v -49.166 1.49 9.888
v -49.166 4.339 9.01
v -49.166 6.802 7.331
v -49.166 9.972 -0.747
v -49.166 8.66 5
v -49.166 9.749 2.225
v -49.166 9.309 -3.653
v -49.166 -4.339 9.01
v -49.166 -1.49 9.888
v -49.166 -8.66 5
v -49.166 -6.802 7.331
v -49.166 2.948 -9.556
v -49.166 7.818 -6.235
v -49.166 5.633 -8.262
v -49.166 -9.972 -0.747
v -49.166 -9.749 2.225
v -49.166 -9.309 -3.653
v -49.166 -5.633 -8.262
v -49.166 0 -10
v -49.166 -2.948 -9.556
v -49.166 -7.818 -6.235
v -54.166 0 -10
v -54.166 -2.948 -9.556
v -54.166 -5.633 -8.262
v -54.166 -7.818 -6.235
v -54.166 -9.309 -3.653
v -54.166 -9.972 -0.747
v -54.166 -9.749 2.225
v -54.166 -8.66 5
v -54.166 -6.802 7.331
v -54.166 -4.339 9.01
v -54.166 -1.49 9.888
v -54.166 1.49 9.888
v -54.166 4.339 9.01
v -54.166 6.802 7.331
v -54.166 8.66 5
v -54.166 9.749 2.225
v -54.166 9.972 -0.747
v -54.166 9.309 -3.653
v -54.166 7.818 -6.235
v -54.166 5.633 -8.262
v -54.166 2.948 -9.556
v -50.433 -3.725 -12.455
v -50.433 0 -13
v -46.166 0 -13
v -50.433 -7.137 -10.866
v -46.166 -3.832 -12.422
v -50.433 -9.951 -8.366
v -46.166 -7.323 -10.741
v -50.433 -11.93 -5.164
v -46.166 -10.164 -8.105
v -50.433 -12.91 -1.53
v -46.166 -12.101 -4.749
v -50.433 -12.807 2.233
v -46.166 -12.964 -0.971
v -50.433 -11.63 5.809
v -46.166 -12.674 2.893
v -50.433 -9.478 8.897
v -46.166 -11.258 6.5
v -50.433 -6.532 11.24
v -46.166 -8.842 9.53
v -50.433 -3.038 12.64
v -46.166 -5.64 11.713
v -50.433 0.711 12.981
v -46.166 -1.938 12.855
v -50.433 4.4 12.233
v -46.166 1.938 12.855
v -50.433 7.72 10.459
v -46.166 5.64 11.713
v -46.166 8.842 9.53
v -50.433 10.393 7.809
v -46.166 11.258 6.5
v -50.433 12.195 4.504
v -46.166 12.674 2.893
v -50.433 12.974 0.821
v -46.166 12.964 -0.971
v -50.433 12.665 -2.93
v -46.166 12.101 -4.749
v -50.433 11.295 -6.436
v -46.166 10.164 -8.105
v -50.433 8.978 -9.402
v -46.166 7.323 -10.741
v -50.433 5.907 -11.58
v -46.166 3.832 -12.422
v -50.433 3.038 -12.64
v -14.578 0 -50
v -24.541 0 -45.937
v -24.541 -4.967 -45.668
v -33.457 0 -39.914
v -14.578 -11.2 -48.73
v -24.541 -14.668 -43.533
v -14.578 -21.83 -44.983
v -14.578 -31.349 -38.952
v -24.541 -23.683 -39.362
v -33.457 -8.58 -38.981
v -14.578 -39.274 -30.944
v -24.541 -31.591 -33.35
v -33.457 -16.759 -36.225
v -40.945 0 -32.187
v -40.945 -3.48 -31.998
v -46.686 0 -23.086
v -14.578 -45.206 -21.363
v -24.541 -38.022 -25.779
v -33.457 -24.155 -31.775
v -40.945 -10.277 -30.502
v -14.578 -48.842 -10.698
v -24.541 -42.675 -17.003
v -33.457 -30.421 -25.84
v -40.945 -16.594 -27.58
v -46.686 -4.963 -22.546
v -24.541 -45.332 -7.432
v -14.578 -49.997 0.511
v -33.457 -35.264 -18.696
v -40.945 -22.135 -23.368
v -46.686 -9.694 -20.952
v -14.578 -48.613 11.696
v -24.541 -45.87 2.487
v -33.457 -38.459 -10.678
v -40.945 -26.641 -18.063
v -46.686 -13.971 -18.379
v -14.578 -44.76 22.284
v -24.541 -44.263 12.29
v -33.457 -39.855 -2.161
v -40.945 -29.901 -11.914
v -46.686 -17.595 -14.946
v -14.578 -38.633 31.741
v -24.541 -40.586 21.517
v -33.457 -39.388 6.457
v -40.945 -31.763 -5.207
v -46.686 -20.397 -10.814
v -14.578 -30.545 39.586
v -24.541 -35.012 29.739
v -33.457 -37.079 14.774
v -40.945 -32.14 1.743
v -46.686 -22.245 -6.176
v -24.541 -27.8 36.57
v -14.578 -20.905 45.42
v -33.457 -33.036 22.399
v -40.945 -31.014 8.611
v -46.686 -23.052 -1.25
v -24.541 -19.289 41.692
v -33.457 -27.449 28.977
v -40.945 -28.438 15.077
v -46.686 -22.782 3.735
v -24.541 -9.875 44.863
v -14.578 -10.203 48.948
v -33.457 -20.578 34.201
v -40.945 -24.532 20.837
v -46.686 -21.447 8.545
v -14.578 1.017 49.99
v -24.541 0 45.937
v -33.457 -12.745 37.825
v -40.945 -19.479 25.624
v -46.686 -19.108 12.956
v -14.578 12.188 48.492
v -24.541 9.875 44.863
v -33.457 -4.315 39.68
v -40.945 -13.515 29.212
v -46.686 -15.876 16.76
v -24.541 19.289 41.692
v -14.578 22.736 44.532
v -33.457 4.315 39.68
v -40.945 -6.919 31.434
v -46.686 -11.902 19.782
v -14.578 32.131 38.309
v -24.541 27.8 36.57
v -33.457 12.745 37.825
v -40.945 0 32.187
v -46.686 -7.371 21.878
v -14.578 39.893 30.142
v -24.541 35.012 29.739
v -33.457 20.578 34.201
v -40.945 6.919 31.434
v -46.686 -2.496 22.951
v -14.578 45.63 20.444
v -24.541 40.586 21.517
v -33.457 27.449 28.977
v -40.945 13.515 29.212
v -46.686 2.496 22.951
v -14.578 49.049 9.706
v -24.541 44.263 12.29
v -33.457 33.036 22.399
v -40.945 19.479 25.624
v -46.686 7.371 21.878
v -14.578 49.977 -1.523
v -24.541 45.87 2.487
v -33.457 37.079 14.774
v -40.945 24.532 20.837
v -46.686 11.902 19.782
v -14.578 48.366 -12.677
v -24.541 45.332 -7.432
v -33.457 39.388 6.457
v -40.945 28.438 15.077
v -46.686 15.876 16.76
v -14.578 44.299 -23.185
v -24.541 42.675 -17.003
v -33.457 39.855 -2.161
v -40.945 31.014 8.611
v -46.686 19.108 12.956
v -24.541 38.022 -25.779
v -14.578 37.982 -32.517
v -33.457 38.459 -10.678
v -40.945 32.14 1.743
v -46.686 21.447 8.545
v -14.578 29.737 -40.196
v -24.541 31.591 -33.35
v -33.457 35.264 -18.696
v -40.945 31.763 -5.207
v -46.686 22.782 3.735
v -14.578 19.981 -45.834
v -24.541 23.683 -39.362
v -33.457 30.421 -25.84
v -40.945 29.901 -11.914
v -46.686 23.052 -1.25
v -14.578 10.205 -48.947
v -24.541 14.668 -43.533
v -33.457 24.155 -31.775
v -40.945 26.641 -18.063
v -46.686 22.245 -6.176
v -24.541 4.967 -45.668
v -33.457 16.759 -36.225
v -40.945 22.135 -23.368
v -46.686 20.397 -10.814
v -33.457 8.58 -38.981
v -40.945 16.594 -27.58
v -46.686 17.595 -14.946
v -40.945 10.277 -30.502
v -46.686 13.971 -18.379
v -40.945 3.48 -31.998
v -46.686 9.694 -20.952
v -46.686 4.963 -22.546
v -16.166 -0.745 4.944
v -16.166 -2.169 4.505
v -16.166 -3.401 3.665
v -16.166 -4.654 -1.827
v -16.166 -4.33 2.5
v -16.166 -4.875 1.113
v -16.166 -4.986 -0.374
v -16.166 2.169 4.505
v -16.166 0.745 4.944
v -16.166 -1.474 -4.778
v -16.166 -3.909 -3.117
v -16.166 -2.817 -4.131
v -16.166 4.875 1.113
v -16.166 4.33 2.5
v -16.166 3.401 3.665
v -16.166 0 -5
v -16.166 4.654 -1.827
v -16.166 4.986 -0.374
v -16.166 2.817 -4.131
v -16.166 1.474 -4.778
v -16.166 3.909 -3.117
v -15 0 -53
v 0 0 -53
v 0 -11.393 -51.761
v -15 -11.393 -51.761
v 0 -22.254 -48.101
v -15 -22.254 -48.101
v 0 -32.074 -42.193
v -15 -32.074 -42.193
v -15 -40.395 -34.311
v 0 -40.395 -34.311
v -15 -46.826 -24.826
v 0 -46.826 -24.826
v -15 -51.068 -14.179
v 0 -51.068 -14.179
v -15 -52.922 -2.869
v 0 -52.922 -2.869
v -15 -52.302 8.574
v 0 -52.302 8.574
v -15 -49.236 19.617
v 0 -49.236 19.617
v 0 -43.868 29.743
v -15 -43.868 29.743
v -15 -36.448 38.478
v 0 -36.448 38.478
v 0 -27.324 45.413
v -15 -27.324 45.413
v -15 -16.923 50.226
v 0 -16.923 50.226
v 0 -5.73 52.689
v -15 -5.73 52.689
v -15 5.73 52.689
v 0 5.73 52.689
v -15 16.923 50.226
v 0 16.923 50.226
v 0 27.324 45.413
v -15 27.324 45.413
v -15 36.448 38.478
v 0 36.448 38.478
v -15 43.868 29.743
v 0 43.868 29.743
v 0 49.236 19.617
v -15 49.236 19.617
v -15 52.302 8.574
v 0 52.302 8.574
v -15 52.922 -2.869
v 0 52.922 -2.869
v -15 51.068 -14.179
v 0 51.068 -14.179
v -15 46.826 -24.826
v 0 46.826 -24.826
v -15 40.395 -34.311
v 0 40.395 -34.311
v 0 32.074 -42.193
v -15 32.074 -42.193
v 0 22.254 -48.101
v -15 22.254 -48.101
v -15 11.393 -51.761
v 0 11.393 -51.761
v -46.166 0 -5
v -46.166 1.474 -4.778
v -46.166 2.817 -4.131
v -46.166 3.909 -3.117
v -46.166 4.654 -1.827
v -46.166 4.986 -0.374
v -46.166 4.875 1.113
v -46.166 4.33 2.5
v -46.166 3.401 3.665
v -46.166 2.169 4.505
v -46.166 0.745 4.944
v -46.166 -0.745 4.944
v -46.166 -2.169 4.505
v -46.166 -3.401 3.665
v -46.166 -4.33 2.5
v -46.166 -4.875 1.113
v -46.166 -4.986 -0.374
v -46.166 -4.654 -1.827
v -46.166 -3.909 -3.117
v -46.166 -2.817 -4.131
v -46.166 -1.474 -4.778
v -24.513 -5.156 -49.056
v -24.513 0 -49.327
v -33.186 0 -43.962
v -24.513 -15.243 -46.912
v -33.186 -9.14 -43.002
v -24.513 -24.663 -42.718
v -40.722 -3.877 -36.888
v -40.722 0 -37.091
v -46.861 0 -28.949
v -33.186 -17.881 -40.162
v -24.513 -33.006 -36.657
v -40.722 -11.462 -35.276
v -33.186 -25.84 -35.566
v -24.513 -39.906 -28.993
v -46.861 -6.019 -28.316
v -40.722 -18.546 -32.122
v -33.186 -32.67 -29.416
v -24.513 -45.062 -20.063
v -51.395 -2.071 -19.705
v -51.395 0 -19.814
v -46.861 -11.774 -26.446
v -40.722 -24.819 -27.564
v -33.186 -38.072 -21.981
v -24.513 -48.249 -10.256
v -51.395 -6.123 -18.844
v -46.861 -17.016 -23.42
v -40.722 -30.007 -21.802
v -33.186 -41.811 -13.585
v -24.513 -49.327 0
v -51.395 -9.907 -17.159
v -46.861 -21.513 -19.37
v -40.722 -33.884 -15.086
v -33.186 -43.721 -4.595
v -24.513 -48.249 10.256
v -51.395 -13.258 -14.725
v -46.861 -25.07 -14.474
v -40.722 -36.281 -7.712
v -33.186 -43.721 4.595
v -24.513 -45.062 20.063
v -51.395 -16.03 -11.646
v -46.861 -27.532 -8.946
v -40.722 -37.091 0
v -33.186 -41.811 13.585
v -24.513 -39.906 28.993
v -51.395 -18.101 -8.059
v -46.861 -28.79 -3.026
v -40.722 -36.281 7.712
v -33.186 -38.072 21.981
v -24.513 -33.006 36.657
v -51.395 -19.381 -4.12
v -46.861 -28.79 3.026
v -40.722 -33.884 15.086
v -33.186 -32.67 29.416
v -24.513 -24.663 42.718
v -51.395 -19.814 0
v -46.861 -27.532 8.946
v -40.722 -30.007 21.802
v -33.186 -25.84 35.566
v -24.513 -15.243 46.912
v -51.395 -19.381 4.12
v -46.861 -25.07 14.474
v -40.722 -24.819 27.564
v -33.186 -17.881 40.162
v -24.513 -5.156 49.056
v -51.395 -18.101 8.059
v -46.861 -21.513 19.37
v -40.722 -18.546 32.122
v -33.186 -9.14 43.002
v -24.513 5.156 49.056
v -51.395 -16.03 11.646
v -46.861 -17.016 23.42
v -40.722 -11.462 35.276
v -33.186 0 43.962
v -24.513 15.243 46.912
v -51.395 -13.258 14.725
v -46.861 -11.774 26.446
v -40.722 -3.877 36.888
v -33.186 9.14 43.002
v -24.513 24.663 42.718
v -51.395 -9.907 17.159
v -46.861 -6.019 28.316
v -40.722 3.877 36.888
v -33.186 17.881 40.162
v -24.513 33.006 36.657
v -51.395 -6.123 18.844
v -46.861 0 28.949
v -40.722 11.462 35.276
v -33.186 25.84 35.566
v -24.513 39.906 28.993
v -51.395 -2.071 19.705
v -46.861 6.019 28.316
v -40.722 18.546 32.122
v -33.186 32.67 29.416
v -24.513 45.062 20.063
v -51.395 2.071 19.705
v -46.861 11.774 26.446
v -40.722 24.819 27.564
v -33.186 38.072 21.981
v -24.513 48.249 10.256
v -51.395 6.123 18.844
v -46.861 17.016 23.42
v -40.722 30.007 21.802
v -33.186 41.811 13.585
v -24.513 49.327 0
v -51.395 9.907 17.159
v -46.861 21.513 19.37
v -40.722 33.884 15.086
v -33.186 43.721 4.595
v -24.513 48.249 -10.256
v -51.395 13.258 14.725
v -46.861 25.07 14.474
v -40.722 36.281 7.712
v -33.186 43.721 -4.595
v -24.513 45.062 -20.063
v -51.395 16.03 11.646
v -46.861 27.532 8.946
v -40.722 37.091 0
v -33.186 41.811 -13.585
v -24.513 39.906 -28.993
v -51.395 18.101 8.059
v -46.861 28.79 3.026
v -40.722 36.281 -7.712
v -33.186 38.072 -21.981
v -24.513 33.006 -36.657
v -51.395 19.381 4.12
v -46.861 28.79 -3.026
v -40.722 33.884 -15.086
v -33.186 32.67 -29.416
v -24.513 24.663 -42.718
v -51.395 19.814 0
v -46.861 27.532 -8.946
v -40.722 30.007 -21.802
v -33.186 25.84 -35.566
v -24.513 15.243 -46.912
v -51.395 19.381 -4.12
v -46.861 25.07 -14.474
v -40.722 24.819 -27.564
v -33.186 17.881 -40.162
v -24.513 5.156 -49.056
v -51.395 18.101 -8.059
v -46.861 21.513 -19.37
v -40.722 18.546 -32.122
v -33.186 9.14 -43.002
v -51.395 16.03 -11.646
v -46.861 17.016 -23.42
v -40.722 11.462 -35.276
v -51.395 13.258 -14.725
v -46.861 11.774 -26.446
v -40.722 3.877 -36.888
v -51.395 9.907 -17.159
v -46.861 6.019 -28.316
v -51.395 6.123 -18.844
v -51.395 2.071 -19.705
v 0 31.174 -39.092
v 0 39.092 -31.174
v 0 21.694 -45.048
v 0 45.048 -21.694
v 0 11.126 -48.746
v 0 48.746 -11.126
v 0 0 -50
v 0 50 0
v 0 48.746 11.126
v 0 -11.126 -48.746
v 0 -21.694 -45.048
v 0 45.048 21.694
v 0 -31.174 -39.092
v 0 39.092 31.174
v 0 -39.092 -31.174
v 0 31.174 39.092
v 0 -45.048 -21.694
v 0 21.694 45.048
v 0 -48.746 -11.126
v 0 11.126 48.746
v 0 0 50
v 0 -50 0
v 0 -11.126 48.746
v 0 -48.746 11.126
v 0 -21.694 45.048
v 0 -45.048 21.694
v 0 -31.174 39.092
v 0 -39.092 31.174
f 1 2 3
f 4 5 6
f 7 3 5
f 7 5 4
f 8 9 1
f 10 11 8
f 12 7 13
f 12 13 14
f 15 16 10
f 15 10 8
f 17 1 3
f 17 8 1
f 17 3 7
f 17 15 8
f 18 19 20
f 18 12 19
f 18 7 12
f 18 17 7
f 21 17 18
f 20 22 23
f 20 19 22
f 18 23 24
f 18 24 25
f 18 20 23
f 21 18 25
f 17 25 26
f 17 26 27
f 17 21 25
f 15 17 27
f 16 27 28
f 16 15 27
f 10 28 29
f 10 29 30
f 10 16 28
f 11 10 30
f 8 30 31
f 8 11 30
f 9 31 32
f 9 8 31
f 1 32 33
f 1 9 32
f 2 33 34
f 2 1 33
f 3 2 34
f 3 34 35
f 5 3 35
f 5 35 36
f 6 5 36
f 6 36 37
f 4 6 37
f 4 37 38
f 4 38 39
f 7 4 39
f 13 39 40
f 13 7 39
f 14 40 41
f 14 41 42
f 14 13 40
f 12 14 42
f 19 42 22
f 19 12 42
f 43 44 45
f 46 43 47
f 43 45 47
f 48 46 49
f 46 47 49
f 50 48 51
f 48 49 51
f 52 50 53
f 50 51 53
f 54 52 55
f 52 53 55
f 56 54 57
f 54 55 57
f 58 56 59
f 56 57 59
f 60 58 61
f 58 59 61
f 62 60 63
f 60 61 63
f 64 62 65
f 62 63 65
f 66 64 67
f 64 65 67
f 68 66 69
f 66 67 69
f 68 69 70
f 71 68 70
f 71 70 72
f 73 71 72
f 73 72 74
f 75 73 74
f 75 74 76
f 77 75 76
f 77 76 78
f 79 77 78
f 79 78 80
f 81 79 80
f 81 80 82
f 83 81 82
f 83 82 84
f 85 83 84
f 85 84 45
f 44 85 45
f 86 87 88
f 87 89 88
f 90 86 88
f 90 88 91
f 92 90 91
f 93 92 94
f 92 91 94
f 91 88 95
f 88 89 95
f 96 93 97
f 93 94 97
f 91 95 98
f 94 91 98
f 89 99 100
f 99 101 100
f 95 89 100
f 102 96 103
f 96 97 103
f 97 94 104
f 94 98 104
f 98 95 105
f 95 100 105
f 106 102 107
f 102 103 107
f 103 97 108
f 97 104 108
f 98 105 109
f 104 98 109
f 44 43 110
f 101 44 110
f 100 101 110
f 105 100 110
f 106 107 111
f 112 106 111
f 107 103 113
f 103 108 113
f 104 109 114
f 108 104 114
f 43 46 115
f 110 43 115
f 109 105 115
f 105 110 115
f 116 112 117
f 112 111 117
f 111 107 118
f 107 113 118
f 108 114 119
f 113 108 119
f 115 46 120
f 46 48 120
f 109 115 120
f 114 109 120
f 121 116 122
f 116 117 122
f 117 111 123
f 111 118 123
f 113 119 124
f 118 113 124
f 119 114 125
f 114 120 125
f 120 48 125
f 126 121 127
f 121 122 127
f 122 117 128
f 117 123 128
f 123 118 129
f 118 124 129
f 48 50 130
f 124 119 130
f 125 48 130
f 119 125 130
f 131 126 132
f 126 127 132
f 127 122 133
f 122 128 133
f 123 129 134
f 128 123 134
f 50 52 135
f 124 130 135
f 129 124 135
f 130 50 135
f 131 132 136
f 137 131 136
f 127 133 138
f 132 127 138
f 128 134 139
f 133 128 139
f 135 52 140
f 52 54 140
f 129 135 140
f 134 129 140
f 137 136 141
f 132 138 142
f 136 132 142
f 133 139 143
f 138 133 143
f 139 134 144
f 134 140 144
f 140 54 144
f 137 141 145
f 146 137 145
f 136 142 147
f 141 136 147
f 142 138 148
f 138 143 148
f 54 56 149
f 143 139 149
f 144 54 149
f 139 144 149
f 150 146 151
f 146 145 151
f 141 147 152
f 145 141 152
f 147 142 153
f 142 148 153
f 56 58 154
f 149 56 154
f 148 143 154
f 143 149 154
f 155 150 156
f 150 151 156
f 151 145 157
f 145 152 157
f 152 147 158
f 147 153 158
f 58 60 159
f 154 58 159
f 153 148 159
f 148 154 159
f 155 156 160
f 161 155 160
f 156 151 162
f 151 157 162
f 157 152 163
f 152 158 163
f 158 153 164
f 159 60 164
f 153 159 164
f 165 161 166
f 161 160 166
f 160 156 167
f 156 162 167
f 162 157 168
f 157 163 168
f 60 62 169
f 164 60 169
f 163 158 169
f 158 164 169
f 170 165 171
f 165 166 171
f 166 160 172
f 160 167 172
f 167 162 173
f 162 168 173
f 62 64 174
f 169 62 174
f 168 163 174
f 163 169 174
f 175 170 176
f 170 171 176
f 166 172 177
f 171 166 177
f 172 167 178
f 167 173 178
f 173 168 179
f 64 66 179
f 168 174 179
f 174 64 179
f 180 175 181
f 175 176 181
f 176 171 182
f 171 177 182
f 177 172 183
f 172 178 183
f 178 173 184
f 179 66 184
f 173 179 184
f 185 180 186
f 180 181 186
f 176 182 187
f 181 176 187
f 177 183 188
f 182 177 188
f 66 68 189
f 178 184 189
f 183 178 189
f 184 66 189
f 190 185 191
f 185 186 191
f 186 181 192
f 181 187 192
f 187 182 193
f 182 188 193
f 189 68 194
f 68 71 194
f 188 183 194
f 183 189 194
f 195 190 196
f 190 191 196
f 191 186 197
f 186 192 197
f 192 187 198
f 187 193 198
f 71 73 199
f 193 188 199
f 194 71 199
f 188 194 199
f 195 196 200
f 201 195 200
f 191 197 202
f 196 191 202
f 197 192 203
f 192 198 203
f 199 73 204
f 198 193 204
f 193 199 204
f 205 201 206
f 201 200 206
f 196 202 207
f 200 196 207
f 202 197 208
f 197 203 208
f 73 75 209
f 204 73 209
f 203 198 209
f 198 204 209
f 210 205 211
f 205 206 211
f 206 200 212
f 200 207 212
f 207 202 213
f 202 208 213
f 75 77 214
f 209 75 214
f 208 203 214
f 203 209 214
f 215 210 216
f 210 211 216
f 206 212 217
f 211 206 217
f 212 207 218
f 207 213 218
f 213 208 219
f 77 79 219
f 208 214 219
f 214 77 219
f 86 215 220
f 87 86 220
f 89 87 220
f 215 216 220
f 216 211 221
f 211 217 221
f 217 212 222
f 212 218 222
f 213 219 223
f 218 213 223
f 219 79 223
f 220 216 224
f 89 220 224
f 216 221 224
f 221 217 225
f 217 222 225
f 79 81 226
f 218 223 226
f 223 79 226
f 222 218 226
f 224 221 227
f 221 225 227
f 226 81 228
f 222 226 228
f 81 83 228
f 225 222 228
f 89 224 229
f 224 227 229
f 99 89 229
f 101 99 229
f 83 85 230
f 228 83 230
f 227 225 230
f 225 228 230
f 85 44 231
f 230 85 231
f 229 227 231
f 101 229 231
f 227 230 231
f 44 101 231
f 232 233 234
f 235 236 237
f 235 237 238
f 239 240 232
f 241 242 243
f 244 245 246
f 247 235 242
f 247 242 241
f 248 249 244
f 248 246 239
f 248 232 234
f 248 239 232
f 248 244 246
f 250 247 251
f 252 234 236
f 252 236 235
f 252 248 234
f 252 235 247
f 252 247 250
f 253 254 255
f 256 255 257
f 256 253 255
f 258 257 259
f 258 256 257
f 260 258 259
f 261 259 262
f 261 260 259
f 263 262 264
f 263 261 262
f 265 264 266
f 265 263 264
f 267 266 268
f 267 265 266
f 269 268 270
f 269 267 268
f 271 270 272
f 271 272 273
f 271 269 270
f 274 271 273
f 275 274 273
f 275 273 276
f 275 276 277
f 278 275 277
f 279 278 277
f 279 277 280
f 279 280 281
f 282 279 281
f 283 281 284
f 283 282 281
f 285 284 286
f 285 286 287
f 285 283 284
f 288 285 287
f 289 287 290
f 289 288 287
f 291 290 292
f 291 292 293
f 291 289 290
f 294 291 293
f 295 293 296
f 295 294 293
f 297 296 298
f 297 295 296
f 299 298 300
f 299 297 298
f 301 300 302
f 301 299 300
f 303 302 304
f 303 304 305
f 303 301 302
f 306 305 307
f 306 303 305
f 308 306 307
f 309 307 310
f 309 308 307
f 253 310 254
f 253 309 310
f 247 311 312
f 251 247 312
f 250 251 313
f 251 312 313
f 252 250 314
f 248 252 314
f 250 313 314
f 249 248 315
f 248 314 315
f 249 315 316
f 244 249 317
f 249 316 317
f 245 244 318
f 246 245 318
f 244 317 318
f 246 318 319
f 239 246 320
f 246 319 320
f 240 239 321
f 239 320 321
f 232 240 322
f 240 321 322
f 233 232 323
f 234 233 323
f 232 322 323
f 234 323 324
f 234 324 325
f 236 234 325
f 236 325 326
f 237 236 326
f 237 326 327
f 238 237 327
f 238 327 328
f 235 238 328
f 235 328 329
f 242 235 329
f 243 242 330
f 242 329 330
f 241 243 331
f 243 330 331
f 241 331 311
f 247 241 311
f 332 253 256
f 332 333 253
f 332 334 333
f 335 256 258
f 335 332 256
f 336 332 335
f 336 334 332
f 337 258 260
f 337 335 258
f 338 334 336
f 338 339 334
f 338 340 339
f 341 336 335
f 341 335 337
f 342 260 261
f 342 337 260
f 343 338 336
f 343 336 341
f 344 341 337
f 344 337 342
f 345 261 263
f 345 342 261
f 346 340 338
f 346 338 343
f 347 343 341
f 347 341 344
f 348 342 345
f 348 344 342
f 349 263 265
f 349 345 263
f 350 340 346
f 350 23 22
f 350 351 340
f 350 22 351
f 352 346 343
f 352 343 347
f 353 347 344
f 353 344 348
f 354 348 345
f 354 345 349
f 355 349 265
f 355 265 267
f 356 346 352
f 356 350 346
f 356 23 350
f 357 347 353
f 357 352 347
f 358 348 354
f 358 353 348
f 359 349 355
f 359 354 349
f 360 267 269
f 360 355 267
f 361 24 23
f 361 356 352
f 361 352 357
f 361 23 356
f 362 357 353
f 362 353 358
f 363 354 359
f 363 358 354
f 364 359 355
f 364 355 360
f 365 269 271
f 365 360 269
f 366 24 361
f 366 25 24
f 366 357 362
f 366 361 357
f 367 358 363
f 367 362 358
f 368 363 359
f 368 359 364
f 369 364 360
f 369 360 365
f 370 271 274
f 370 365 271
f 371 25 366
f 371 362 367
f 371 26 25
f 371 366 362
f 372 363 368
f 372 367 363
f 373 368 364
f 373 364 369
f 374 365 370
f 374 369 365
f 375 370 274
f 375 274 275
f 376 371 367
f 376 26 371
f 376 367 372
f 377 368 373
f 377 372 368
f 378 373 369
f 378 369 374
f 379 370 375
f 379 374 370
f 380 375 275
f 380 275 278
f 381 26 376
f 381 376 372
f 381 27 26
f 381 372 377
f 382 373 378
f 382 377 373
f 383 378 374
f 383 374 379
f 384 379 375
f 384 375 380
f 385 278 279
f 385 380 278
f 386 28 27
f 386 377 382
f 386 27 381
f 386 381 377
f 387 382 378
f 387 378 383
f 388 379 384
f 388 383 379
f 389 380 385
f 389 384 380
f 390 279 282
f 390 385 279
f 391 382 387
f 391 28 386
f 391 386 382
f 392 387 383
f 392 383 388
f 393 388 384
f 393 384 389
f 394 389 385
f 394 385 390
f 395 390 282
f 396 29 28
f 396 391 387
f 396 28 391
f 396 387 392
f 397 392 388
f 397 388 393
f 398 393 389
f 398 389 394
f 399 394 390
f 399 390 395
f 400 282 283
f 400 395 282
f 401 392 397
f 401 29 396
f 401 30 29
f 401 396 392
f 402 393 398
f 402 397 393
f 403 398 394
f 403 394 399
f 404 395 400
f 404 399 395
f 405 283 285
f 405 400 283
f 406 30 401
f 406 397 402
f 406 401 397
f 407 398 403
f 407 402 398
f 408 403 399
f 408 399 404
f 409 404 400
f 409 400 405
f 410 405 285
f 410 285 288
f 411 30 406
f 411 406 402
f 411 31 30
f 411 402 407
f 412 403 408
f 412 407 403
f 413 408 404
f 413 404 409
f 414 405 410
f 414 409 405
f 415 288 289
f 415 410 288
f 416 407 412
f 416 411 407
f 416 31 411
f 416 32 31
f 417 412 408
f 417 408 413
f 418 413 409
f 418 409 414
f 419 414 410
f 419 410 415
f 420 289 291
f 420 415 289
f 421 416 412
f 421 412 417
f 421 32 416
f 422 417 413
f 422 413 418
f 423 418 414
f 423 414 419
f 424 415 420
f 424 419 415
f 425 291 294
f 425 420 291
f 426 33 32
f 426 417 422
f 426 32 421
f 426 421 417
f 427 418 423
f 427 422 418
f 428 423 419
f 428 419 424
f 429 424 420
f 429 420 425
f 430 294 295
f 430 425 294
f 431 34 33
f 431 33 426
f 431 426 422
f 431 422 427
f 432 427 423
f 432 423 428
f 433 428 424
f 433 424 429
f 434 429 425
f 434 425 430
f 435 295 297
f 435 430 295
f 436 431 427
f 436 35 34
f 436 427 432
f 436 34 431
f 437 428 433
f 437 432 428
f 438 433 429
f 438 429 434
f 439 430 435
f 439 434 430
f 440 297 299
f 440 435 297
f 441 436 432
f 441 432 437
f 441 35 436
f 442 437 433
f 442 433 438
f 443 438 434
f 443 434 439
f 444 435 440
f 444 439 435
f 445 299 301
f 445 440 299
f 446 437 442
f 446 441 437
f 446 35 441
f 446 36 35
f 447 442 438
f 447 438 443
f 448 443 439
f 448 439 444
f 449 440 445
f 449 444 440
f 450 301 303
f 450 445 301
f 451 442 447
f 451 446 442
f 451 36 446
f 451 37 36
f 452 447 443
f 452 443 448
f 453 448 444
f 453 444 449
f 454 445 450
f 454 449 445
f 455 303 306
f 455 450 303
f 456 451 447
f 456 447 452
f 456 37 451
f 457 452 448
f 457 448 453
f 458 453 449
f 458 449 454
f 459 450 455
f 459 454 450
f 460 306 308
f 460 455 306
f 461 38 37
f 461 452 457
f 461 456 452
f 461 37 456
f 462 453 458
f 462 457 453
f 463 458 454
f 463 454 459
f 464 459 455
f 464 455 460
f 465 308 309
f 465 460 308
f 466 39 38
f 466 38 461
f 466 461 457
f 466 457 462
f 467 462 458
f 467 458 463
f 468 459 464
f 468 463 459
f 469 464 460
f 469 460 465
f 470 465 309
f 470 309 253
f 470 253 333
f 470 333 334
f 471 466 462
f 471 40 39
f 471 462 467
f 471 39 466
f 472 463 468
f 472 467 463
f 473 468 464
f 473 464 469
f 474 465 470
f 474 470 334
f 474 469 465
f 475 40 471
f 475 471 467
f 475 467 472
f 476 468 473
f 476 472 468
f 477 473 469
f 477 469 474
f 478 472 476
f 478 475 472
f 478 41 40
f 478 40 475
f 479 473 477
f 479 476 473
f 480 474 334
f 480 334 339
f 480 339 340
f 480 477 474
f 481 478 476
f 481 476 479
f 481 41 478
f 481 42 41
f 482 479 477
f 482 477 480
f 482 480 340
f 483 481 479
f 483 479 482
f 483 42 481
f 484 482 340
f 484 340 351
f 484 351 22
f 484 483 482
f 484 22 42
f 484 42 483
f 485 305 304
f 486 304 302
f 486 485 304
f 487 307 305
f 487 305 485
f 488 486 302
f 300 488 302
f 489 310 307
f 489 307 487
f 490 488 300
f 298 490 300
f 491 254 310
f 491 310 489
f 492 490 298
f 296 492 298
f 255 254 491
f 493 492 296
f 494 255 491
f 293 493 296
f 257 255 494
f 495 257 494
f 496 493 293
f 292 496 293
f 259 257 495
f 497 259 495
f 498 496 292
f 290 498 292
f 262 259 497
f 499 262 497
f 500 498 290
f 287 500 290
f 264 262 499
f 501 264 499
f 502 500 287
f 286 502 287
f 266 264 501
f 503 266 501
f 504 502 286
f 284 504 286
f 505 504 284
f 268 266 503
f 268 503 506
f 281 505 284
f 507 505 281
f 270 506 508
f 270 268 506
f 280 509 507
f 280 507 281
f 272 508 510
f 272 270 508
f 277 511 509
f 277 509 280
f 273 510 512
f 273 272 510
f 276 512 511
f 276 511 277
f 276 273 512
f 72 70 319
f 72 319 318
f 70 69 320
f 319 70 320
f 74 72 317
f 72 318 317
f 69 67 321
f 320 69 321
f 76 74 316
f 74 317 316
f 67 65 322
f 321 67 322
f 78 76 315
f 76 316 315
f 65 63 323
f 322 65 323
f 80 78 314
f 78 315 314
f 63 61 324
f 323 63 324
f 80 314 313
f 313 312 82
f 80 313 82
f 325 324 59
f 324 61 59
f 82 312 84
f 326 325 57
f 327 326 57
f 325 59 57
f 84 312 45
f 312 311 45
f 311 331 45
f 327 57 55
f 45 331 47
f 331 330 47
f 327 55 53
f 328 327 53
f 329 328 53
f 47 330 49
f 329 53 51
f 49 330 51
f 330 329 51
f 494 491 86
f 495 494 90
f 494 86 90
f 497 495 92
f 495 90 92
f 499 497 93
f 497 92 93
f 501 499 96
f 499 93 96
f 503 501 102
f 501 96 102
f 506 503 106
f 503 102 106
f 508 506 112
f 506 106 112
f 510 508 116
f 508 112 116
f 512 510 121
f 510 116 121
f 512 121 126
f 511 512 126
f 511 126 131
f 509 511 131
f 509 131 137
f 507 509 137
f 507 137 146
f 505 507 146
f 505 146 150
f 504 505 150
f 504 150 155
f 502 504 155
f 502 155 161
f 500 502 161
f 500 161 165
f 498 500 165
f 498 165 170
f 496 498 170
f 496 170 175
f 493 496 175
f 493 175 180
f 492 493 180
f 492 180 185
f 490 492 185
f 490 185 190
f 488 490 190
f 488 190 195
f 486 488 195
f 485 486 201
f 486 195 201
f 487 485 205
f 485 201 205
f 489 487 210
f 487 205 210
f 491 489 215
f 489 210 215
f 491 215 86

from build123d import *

# Parameters (mm, degrees)
SHELL1_T            = -3
SKETCH3_R           = 5
BOSS_EXTRUDE1_DEPTH = 30


with BuildPart() as part:
    # Sketch2 → Revolve1 (revolve)
    with BuildSketch(Plane.XY, mode=Mode.PRIVATE) as revolve1_sk:
        with BuildLine():
            Line((0, 0), (0, 53))
            Line((0, 53), (-15, 53))
            ThreePointArc((-15, 53), (-40.721592269, 37.091129978), (-54.166410256, 10))
            Line((-54.166410256, 10), (-49.166410256, 10))
            Line((-49.166410256, 10), (-49.166410256, 0))
            Line((-49.166410256, 0), (0, 0))
        make_face()
    revolve(revolve1_sk.sketch.rotate(Axis((0, 0, 0), (-1, 0, 0)), 90), axis=Axis((0, 0, 0), (-1, 0, 0)))

    # Shell1
    shell1_openings = [part.faces().sort_by_distance(p)[0] for p in [
        (0, 0, 0),
    ]]
    offset(amount=SHELL1_T, openings=shell1_openings, kind=Kind.INTERSECTION)

    # Sketch3 → Boss-Extrude1 (add)
    with BuildSketch(Plane(origin=(-46.166410256, 0, 0), x_dir=(0, 0, -1), z_dir=(1, 0, 0))):
        Circle(SKETCH3_R)
    extrude(amount=BOSS_EXTRUDE1_DEPTH)


solid = part.part
